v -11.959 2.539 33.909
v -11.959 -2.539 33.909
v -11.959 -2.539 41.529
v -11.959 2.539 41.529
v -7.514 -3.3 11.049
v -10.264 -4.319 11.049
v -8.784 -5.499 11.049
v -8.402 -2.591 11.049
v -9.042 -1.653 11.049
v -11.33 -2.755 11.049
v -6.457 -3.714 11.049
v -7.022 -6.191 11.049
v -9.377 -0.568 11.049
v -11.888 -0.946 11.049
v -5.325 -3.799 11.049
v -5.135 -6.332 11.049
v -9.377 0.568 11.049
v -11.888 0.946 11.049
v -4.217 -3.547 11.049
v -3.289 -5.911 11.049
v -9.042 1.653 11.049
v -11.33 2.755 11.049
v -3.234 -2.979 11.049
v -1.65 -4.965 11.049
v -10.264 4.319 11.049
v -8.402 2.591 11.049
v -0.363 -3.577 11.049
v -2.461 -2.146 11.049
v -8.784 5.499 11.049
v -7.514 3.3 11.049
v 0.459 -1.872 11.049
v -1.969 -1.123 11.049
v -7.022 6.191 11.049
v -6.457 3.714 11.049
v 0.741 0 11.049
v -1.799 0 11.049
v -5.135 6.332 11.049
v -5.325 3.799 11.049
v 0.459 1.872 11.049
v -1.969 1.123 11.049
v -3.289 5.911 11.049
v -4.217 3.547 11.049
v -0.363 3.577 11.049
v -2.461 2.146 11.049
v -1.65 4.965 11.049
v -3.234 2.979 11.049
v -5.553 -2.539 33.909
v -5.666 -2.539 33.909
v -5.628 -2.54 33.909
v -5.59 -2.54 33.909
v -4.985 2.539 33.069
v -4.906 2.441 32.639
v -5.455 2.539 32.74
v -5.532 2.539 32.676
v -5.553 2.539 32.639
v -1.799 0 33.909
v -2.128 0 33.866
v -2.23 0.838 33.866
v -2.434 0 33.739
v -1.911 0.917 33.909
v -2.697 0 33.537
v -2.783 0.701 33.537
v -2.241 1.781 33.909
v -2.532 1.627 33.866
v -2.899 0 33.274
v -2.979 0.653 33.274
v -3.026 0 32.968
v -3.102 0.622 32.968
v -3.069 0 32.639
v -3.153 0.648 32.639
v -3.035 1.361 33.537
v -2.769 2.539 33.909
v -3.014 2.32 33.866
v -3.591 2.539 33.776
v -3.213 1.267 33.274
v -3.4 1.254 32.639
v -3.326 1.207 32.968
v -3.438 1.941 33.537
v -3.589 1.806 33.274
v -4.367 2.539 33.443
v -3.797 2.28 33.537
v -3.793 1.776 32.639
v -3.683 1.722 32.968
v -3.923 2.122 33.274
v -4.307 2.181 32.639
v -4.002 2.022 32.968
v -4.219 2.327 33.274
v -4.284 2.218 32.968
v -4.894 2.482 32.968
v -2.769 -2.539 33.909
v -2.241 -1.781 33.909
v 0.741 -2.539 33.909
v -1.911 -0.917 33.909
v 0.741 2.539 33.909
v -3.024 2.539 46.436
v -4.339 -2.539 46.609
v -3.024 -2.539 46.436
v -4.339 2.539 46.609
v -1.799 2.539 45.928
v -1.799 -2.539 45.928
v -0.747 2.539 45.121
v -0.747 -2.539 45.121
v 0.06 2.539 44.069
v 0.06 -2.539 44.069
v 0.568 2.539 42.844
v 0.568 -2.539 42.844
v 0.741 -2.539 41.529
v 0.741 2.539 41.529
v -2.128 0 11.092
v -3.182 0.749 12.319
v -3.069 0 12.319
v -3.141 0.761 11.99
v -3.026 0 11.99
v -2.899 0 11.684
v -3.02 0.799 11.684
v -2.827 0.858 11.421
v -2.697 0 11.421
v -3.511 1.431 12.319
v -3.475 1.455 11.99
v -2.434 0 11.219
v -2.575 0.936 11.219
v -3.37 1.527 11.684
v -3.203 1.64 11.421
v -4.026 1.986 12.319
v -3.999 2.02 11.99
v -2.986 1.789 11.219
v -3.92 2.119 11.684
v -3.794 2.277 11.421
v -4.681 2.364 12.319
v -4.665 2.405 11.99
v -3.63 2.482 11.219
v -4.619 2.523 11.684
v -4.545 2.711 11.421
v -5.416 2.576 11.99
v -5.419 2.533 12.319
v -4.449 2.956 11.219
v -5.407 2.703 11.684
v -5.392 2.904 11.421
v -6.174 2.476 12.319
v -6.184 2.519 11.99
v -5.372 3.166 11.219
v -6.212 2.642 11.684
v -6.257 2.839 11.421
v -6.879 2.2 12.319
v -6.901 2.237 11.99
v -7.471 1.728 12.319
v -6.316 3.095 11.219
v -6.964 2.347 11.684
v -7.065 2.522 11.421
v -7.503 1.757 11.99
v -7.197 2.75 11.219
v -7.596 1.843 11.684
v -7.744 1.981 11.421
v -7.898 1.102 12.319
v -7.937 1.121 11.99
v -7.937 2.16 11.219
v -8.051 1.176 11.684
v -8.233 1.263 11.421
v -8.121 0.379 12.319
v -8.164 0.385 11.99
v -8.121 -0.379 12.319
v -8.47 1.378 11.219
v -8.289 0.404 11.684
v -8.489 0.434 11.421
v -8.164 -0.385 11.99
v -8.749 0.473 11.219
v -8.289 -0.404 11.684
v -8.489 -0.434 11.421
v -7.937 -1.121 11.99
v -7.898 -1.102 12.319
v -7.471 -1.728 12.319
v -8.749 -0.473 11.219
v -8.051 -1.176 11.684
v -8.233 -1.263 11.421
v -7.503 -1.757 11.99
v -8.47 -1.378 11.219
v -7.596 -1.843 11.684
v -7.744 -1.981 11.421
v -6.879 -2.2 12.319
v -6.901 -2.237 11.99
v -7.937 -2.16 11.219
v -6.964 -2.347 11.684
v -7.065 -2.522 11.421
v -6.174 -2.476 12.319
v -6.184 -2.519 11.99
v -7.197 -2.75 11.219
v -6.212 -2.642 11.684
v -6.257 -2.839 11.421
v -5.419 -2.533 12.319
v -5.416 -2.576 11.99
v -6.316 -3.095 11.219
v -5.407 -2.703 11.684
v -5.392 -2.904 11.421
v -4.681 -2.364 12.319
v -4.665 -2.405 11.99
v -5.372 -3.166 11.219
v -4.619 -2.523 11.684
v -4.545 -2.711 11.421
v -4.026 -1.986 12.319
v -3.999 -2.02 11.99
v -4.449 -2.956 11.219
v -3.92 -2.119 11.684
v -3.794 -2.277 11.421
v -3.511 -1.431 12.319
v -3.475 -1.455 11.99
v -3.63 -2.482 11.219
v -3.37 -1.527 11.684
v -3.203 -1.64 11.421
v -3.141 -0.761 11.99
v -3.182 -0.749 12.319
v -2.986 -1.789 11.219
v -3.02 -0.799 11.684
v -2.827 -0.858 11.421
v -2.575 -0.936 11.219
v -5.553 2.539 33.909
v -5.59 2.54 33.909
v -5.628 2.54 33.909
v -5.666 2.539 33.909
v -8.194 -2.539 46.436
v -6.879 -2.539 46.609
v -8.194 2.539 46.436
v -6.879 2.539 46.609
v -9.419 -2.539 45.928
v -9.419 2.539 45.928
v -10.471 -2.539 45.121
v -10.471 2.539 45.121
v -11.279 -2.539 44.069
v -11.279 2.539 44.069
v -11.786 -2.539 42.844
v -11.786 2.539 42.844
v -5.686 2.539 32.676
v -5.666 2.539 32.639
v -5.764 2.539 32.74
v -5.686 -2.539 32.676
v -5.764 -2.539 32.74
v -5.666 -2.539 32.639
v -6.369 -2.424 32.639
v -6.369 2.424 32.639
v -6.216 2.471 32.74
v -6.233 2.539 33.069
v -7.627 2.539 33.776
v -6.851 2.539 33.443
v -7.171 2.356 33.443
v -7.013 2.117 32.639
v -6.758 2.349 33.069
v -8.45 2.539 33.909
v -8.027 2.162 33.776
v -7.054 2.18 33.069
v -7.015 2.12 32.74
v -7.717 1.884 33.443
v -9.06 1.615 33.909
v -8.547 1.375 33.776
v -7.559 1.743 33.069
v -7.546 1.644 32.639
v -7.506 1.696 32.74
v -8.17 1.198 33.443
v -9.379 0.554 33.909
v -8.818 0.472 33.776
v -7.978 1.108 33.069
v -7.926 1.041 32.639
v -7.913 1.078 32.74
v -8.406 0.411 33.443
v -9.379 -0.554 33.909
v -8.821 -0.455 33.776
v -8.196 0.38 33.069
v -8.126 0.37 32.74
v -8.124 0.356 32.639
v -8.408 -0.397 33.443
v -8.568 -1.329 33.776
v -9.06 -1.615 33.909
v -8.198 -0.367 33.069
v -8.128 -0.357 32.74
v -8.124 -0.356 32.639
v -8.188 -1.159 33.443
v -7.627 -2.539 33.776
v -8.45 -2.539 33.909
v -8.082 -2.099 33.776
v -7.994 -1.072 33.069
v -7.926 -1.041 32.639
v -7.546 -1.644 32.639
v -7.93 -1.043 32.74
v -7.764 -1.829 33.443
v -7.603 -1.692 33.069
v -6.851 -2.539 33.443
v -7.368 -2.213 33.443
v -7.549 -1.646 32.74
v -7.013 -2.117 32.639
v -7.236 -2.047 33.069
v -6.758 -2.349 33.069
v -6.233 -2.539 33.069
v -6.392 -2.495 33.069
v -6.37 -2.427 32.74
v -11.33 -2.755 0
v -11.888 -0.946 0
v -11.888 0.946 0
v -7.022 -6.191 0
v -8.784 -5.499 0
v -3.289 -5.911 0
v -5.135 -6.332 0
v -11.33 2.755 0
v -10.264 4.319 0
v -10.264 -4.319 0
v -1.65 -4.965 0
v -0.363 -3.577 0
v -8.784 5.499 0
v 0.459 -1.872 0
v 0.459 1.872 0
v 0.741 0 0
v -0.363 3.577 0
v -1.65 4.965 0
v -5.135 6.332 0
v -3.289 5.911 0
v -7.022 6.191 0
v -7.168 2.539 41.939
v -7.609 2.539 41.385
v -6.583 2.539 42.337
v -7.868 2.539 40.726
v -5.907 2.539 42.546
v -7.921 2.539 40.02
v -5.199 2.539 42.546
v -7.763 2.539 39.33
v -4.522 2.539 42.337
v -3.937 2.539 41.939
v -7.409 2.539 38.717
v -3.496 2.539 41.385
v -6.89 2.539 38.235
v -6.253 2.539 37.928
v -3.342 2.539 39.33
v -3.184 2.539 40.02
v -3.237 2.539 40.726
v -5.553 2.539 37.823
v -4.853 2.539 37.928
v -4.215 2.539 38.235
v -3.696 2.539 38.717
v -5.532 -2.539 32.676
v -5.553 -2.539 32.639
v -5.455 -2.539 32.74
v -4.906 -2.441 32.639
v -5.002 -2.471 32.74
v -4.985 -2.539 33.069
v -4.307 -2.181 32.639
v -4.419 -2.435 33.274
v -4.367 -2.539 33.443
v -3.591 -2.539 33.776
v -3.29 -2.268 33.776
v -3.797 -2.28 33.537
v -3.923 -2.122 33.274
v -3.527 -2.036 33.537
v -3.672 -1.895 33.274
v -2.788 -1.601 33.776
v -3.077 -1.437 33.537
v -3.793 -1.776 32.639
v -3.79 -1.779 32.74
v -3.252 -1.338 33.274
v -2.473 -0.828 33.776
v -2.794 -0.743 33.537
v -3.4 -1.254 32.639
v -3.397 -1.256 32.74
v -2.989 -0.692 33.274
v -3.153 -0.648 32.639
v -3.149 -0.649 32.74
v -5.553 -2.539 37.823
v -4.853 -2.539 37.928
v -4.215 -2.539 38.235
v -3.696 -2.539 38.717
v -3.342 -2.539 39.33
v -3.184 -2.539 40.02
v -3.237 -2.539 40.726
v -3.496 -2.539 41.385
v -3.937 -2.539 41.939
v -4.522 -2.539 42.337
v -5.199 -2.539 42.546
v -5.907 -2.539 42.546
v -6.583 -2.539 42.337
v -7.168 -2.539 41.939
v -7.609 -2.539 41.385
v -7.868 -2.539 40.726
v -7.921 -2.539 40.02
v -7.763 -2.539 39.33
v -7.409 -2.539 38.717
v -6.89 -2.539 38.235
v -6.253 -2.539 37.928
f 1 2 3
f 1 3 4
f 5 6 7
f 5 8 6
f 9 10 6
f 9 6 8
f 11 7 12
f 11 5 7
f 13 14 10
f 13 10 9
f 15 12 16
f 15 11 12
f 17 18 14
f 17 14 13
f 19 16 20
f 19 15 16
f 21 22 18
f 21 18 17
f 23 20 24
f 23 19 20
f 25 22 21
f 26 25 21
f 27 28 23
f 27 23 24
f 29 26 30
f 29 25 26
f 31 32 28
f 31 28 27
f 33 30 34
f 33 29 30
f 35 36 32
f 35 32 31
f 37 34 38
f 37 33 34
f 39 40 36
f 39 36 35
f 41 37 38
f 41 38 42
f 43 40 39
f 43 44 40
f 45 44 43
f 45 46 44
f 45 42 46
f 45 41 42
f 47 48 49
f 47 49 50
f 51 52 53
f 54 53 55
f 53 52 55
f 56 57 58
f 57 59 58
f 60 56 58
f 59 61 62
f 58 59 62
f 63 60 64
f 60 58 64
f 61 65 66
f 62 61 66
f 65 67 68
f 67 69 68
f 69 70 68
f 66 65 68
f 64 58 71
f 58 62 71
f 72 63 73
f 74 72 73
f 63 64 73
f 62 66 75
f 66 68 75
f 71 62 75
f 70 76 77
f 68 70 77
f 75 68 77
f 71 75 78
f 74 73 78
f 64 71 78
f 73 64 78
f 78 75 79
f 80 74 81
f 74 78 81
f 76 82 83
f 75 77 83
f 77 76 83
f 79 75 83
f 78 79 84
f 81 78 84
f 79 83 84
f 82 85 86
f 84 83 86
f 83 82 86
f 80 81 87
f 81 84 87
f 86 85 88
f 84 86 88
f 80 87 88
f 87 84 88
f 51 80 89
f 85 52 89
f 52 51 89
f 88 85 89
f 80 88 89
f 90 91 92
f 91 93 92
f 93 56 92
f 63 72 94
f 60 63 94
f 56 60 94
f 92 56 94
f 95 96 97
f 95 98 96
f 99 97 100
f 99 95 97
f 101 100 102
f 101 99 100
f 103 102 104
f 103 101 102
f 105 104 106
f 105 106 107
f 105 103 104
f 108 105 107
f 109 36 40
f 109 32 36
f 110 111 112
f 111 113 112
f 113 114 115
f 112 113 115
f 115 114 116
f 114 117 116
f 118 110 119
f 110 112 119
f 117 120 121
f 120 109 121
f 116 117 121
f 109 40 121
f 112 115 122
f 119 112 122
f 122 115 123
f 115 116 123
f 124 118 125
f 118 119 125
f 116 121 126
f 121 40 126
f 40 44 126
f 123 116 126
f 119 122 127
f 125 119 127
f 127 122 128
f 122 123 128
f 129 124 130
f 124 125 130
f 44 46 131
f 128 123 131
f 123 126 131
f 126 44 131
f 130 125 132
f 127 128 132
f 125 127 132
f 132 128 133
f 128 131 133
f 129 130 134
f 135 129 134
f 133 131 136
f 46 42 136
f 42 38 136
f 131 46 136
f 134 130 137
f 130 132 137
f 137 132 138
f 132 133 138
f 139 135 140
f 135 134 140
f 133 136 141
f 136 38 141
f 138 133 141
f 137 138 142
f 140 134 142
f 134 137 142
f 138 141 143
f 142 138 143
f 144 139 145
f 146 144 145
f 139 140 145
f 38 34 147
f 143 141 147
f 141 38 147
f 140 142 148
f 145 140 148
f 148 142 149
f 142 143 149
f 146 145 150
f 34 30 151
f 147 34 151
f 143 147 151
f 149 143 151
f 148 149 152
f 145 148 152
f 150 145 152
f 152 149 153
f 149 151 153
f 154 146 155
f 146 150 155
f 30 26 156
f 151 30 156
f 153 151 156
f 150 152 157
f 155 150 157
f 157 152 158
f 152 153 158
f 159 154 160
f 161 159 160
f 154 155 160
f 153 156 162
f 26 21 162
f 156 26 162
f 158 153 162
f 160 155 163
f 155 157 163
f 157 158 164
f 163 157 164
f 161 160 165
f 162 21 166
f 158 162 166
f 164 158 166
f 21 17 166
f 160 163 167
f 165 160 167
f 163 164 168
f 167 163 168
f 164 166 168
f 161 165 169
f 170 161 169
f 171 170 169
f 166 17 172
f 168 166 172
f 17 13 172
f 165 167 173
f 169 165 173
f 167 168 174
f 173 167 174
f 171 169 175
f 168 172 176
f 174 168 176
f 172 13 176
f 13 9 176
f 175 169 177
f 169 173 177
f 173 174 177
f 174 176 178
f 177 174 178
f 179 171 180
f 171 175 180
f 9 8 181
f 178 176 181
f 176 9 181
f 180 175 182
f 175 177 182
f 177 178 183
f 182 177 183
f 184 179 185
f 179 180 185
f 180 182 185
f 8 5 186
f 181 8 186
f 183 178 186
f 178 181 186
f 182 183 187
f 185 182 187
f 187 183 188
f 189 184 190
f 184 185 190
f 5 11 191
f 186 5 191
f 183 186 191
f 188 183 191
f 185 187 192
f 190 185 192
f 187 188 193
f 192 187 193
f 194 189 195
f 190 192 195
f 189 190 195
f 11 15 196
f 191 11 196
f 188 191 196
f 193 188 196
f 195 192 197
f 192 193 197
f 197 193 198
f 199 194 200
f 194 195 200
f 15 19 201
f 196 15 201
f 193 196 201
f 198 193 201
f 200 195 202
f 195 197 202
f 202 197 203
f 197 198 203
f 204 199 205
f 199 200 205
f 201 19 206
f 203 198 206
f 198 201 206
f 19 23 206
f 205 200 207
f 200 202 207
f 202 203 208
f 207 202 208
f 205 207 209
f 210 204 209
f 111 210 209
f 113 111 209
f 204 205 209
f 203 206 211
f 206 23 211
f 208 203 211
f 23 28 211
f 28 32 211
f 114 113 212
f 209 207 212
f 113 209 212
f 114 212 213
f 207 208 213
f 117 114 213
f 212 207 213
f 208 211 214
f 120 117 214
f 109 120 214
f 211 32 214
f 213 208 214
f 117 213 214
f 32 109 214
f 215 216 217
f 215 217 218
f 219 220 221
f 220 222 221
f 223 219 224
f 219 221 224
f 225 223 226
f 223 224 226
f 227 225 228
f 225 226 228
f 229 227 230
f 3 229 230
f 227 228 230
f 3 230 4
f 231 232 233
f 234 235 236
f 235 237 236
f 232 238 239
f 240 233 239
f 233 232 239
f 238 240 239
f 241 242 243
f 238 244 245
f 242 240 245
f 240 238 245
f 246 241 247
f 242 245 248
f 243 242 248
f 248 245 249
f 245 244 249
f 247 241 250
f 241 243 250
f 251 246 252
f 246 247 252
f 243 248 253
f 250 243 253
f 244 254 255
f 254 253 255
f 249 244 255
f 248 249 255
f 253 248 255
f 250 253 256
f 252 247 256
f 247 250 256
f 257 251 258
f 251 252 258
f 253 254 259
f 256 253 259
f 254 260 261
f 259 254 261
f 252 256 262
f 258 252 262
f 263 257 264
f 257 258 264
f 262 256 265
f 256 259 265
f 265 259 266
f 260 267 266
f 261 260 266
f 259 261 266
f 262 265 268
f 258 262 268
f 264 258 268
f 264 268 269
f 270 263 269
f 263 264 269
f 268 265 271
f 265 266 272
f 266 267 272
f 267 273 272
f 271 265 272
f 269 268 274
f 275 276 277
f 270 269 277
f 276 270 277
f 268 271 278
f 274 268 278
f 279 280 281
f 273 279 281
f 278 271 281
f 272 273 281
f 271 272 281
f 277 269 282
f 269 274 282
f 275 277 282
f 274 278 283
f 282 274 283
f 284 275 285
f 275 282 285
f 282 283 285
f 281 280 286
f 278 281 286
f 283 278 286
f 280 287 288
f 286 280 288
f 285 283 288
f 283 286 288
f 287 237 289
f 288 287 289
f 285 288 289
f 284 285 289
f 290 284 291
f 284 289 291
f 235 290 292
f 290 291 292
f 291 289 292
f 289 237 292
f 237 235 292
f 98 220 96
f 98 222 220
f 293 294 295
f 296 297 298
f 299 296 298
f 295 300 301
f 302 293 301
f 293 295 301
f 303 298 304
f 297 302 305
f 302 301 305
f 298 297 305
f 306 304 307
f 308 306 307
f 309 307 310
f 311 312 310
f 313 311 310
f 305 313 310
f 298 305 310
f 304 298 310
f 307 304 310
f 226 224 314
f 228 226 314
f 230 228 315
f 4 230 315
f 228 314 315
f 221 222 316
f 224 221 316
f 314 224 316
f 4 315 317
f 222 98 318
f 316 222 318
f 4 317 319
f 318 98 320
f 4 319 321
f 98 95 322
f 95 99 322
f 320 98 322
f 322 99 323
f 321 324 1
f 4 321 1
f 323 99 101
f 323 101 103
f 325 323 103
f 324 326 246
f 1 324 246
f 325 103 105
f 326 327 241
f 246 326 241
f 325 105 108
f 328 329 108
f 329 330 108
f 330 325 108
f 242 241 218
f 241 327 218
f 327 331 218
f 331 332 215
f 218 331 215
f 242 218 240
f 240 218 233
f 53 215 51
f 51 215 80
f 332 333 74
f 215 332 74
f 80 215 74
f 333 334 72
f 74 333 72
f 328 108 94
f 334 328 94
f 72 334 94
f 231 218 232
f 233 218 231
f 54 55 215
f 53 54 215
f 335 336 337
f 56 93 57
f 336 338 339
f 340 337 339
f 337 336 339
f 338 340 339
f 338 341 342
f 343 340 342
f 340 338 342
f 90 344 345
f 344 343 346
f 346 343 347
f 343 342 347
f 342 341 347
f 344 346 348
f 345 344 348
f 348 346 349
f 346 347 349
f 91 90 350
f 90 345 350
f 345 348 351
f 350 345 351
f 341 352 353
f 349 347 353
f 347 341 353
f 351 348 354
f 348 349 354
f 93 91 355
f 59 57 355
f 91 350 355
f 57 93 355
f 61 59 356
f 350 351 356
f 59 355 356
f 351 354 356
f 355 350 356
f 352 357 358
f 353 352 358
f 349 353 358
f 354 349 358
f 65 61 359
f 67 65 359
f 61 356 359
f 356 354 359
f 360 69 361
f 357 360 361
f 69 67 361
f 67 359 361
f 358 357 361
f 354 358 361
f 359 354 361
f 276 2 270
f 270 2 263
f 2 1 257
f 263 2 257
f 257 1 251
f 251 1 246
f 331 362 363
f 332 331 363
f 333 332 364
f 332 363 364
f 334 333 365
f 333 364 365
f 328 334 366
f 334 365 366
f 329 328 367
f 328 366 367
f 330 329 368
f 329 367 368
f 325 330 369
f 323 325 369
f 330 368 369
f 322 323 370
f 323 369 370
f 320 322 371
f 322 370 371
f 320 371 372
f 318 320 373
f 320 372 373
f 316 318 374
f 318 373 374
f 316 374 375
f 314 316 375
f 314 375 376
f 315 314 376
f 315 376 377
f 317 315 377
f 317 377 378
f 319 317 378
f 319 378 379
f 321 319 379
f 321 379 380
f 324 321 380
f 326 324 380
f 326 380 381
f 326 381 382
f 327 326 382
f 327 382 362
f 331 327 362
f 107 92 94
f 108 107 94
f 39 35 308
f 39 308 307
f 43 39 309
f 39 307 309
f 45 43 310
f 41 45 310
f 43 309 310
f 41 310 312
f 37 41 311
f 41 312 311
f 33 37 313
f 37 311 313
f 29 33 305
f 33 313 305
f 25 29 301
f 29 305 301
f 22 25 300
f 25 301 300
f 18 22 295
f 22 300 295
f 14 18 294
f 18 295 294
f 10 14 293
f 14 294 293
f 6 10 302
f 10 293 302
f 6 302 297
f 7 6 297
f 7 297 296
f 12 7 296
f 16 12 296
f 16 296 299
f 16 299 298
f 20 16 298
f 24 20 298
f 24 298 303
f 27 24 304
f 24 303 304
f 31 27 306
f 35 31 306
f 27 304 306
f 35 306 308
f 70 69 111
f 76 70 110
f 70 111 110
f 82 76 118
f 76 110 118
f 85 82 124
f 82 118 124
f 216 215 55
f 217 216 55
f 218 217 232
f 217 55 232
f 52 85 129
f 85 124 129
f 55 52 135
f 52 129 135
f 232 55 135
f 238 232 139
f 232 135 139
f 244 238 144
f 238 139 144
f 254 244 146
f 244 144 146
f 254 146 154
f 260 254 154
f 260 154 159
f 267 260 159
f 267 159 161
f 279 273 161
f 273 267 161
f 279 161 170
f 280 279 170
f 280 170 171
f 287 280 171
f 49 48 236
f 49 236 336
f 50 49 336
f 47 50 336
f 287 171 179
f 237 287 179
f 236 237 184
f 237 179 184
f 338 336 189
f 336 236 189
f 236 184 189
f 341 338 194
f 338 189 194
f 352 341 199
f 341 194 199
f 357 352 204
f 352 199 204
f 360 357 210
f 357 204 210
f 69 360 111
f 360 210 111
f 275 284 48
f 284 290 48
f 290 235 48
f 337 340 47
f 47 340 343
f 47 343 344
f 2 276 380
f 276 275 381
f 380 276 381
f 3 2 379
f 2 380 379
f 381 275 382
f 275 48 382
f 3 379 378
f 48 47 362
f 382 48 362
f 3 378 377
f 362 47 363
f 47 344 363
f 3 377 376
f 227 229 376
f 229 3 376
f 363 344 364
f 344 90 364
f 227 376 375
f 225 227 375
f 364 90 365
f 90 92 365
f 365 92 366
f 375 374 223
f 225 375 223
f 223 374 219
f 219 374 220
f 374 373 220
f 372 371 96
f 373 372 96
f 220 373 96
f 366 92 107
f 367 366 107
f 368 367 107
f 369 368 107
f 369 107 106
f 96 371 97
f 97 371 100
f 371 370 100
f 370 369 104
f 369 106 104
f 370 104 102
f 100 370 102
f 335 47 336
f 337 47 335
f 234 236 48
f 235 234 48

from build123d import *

# Parameters (mm, degrees)
SKETCH1_R           = 6.35
BOSS_EXTRUDE1_DEPTH = 11.049
SKETCH2_R           = 2.54
BOSS_EXTRUDE2_DEPTH = 22.86
SKETCH3_W           = 12.7
SKETCH3_H           = 5.078733264
BOSS_EXTRUDE3_DEPTH = 12.7
SKETCH4_R           = 2.3749
CUT_EXTRUDE1_DEPTH  = 12.7
FILLET2_R           = 5.08
FILLET3_R           = 5.08
FILLET5_R           = 1.27


with BuildPart() as part:
    # Sketch1 → Boss-Extrude1 (new body)
    with BuildSketch(Plane.XY):
        with Locations((-5.609264719, 0)):
            Circle(SKETCH1_R)
    extrude(amount=BOSS_EXTRUDE1_DEPTH)

    # Sketch2 → Boss-Extrude2 (add)
    with BuildSketch(Plane.XY.offset(11.049)):
        with Locations((-5.609264719, 0)):
            Circle(SKETCH2_R)
    extrude(amount=BOSS_EXTRUDE2_DEPTH)

    # Sketch3 → Boss-Extrude3 (add)
    with BuildSketch(Plane.XY.offset(33.909)):
        with Locations((-5.609264719, 0)):
            Rectangle(SKETCH3_W, SKETCH3_H)
    extrude(amount=BOSS_EXTRUDE3_DEPTH)

    # Sketch4 → Cut-Extrude1 (cut)
    with BuildSketch(Plane.XZ.offset(2.539366632)):
        with Locations(Location((-5.552545155, 40.197708747, 0), (0, 0, 270))):
            Circle(SKETCH4_R)
    extrude(amount=-CUT_EXTRUDE1_DEPTH, mode=Mode.SUBTRACT)

    # Fillet2
    fillet2_edges = [part.edges().sort_by_distance(p)[0] for p in [
        (0.740735281, 0, 46.609),
    ]]
    fillet(fillet2_edges, radius=FILLET2_R)

    # Fillet3
    fillet3_edges = [part.edges().sort_by_distance(p)[0] for p in [
        (-11.959264719, 0, 46.609),
    ]]
    fillet(fillet3_edges, radius=FILLET3_R)

    # Fillet5
    # the kernel refuses this fillet: 1.27 mm, written as the material it adds along each edge
    with BuildSketch(Plane(origin=(-5.609264719, 0, 11.049), x_dir=(1, 0, 0), z_dir=(0, -1, 0))) as fillet5_piece_1:
        with BuildLine():
            CenterArc((2.54 + FILLET5_R, FILLET5_R), FILLET5_R, 180, 90)
            Line((2.54 + FILLET5_R, 0), (2.54, 0))
            Line((2.54, 0), (2.54, FILLET5_R))
        make_face()
    revolve(axis=Axis((-5.609264719, 0, 11.049), (0, 0, 1)))
    with BuildSketch(Plane(origin=(-5.609264719, 0, 33.909), x_dir=(-0.9418707182707275, -0.3359755200370762, 0), z_dir=(-0.3359755200370762, 0.9418707182707275, 0))) as fillet5_piece_2_section:
        with BuildLine():
            CenterArc((2.54 + FILLET5_R, -FILLET5_R), FILLET5_R, 90, 90)
            Line((2.54, -FILLET5_R), (2.54, 0))
            Line((2.54, 0), (2.54 + FILLET5_R, 0))
        make_face()
    fillet5_piece_2 = revolve(axis=Axis((-5.609264719, 0, 33.909), (0, 0, 1)), revolution_arc=160.368130272, mode=Mode.PRIVATE)
    fillet5_piece_2 = split(fillet5_piece_2, bisect_by=Plane(origin=(-7.562831834, -2.539366632, 33.60366216), z_dir=(0, 1, 0)), keep=Keep.TOP, mode=Mode.PRIVATE)
    add(fillet5_piece_2)
    with BuildSketch(Plane(origin=(-5.609264719, 0, 33.909), x_dir=(0.9423620673245245, 0.3345948805164961, 0), z_dir=(0.3345948805164961, -0.9423620673245245, 0))) as fillet5_piece_3_section:
        with BuildLine():
            CenterArc((2.54 + FILLET5_R, -FILLET5_R), FILLET5_R, 90, 90)
            Line((2.54, -FILLET5_R), (2.54, 0))
            Line((2.54, 0), (2.54 + FILLET5_R, 0))
        make_face()
    fillet5_piece_3 = revolve(axis=Axis((-5.609264719, 0, 33.909), (0, 0, 1)), revolution_arc=320.904190545, mode=Mode.PRIVATE)
    fillet5_piece_3 = split(fillet5_piece_3, bisect_by=Plane(origin=(-3.654388509, -2.539366632, 33.60372255), z_dir=(0, 1, 0)), keep=Keep.TOP, mode=Mode.PRIVATE)
    fillet5_piece_3 = split(fillet5_piece_3, bisect_by=Plane(origin=(-3.654388509, 2.539366632, 33.60372255), z_dir=(0, -1, 0)), keep=Keep.TOP, mode=Mode.PRIVATE)
    add(fillet5_piece_3)
    with BuildSketch(Plane(origin=(-5.609264719, 0, 33.909), x_dir=(1, 0, 0), z_dir=(0, -1, 0))) as fillet5_piece_4_section:
        with BuildLine():
            CenterArc((2.54 + FILLET5_R, -FILLET5_R), FILLET5_R, 90, 90)
            Line((2.54, -FILLET5_R), (2.54, 0))
            Line((2.54, 0), (2.54 + FILLET5_R, 0))
        make_face()
    fillet5_piece_4 = revolve(axis=Axis((-5.609264719, 0, 33.909), (0, 0, 1)), revolution_arc=160.368130272, mode=Mode.PRIVATE)
    fillet5_piece_4 = split(fillet5_piece_4, bisect_by=Plane(origin=(-3.407688785, 2.539366632, 33.61360523), z_dir=(0, -1, 0)), keep=Keep.TOP, mode=Mode.PRIVATE)
    add(fillet5_piece_4)


solid = part.part
